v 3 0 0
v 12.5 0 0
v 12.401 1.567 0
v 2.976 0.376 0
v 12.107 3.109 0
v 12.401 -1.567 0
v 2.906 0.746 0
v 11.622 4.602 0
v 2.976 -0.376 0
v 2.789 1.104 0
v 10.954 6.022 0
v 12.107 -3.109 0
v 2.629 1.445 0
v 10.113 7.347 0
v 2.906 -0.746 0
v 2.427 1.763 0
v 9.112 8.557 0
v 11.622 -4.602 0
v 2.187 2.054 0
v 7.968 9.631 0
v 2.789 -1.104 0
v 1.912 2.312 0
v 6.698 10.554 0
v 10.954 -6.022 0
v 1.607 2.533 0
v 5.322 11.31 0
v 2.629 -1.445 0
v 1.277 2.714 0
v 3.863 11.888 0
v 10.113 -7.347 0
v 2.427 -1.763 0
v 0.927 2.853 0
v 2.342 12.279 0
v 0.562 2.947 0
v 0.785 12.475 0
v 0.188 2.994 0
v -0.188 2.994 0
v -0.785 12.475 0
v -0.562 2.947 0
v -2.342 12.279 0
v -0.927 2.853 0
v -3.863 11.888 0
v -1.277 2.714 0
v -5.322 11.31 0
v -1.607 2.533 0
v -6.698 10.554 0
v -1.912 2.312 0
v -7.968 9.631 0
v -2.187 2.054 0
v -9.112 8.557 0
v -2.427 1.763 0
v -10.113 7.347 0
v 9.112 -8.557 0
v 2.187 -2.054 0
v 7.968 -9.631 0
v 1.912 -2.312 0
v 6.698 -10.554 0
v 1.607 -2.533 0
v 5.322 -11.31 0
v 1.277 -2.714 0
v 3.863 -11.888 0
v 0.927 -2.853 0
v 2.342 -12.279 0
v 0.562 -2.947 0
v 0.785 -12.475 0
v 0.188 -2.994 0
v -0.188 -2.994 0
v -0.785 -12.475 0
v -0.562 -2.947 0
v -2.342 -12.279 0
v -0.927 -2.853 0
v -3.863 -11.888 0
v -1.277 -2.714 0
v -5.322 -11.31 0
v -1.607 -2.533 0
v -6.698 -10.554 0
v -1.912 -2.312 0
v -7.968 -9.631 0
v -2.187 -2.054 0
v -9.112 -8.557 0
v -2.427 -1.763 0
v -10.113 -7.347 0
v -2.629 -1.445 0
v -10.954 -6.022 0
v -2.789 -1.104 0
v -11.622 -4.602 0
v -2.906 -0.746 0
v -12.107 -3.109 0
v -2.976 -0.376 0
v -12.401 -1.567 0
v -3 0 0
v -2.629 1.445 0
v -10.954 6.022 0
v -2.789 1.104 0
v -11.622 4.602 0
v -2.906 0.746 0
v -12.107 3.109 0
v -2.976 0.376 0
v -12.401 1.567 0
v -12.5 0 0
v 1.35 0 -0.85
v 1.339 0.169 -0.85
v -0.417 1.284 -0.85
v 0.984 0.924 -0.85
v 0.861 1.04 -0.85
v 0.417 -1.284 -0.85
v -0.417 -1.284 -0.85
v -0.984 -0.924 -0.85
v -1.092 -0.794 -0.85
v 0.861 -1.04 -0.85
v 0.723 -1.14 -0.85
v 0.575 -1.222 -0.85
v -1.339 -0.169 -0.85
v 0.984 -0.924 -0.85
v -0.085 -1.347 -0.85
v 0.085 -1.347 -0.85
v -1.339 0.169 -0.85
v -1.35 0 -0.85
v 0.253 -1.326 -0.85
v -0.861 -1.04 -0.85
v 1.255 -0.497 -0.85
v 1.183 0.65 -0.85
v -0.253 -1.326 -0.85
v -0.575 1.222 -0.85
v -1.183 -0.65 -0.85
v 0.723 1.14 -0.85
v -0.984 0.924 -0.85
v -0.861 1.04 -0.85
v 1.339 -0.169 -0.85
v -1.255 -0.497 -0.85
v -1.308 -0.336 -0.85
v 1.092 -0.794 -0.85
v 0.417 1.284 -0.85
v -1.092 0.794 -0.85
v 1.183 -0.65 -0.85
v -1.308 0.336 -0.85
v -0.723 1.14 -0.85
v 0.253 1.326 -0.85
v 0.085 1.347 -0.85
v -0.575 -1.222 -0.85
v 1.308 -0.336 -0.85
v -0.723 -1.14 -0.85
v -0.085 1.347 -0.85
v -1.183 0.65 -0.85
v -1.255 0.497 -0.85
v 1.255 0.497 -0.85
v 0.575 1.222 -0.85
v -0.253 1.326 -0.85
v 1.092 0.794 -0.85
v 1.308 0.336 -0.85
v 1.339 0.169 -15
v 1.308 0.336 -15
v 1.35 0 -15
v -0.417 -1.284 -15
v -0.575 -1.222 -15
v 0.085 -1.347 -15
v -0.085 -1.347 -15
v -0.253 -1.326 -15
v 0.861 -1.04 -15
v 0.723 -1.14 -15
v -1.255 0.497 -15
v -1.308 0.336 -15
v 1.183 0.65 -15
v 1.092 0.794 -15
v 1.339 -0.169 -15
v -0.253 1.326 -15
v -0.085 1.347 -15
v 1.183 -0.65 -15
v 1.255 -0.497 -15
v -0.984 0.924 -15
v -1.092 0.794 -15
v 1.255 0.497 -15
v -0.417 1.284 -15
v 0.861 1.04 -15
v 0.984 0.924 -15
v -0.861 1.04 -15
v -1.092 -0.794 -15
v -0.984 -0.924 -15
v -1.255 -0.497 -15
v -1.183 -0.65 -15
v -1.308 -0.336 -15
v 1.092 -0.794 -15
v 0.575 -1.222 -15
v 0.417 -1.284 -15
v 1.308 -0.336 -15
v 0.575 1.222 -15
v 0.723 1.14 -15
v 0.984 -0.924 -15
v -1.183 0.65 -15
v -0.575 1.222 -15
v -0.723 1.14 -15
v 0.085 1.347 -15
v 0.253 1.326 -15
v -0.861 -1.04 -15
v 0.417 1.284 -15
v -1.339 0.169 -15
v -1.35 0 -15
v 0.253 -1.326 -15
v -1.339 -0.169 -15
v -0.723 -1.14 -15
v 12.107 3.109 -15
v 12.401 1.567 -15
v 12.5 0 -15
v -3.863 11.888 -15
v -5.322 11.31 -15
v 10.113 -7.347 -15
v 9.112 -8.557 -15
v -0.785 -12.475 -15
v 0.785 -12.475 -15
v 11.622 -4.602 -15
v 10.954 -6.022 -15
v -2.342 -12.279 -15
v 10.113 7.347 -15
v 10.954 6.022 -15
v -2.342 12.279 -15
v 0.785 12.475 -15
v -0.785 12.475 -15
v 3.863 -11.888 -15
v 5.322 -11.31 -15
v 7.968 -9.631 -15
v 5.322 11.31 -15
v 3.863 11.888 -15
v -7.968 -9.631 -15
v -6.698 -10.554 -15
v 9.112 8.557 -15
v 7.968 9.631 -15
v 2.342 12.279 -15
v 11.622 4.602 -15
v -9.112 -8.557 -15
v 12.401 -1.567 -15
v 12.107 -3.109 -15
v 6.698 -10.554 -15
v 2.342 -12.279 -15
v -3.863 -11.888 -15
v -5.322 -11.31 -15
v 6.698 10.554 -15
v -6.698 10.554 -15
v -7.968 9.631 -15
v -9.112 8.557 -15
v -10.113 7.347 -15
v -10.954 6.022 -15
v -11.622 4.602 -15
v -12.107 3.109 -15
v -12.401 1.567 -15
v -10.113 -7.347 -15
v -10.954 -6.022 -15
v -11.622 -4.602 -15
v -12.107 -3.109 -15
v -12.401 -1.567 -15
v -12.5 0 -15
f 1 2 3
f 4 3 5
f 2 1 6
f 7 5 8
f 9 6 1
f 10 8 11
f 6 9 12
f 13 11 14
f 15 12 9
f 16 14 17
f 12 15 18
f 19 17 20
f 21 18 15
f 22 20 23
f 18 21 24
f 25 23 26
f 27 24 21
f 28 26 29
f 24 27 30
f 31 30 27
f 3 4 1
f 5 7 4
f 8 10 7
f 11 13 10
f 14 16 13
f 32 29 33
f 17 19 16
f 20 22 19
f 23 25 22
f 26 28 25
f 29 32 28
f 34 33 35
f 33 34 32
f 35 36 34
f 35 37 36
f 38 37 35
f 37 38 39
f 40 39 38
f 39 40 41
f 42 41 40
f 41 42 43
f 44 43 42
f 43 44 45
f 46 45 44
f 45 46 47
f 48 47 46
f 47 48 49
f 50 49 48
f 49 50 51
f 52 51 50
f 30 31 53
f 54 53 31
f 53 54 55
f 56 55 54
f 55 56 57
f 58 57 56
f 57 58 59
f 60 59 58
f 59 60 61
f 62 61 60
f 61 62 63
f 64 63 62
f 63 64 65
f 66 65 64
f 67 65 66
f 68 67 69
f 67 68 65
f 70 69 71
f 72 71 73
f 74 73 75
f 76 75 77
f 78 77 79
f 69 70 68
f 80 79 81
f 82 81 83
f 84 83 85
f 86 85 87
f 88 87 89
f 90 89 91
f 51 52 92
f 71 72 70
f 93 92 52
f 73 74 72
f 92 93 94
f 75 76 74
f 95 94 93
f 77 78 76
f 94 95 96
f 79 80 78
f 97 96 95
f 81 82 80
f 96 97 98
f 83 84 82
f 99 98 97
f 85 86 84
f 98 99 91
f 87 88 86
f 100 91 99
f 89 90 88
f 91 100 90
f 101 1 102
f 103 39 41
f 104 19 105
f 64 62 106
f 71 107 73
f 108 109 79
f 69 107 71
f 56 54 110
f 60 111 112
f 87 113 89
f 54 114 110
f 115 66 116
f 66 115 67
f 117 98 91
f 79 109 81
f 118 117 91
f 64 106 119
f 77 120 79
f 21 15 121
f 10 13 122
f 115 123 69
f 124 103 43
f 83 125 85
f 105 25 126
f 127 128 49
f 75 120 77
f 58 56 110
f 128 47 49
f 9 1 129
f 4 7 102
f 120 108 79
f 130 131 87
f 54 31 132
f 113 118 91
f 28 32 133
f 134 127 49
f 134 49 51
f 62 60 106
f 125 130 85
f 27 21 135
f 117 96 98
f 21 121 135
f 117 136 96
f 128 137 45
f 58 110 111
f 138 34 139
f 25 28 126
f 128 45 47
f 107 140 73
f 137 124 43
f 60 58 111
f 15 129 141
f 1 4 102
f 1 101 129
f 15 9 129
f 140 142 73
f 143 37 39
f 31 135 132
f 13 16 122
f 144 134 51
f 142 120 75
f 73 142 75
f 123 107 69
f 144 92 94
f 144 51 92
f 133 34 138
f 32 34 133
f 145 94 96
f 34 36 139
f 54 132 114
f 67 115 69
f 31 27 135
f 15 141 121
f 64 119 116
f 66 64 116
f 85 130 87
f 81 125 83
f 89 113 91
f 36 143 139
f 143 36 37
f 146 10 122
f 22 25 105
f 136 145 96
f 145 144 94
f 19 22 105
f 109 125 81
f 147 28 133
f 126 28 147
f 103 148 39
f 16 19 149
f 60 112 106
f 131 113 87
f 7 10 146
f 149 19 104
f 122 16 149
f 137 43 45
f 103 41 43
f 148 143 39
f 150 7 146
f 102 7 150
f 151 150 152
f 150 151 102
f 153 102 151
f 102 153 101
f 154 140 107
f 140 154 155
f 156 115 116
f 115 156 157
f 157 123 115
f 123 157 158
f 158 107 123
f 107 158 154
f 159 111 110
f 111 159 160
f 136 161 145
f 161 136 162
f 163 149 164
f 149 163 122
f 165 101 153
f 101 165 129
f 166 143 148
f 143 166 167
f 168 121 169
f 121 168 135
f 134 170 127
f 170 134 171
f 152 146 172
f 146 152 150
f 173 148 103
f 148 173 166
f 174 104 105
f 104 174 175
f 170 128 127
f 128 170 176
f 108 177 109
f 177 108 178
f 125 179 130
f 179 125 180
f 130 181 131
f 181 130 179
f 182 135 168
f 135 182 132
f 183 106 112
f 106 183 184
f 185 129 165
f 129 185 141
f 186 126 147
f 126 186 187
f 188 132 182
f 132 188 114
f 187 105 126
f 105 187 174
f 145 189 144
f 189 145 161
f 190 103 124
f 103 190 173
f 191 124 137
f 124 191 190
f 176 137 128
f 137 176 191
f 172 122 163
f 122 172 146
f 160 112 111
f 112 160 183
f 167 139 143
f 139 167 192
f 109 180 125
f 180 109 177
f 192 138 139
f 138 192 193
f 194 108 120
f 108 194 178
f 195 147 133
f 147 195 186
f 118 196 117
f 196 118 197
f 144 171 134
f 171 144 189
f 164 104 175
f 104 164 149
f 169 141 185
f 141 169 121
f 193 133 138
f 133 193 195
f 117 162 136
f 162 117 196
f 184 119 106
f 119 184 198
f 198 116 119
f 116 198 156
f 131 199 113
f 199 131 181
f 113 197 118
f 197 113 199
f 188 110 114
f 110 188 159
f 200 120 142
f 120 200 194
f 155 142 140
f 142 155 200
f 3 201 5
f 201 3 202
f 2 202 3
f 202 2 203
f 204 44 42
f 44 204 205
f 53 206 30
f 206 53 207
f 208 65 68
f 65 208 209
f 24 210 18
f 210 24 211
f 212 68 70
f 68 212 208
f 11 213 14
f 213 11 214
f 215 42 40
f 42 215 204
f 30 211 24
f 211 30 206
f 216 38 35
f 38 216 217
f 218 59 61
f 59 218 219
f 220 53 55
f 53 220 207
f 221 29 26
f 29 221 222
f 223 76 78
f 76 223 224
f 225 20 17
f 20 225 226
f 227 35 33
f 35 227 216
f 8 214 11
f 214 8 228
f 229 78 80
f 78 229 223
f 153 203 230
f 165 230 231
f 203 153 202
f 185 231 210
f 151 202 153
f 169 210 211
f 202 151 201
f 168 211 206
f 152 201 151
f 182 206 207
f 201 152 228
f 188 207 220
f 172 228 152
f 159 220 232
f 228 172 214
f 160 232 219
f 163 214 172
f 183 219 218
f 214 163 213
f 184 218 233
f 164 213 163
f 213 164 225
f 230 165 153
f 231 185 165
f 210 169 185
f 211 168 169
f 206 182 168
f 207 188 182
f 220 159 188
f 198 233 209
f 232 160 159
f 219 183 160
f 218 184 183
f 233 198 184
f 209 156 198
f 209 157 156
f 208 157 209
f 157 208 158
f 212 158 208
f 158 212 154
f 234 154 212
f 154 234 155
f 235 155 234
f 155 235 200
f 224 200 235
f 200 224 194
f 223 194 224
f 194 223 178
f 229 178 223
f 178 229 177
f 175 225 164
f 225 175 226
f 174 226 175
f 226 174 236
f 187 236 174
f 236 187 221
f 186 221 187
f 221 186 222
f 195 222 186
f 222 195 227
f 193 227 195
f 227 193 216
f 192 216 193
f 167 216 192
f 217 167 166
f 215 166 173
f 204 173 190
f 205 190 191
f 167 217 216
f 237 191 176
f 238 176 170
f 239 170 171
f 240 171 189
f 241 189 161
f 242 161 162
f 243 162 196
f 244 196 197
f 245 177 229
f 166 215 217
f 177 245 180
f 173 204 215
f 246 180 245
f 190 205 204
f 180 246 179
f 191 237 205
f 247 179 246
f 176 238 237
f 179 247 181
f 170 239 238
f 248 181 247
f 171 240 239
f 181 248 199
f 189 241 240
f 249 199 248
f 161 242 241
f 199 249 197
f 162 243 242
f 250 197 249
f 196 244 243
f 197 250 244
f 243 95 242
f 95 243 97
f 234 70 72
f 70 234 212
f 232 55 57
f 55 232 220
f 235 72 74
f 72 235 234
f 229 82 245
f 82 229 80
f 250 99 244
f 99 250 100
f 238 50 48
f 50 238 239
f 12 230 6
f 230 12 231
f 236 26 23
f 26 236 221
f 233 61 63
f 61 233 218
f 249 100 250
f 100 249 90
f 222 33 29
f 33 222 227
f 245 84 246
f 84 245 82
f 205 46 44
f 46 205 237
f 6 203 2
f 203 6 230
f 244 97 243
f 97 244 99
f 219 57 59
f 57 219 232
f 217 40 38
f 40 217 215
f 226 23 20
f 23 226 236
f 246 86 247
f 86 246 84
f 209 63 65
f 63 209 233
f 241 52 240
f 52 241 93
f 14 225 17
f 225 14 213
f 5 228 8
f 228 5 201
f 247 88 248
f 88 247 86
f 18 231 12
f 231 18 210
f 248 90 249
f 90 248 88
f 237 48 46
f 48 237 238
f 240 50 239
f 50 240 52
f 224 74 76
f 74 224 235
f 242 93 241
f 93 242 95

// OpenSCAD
$fn = 50;

difference() {
	union() {
		translate(v = [0, 0, -15.0]) {
			cylinder(h = 15, r = 12.5);
		}
	}
	union() {
		translate(v = [0, 0, 0]) {
			rotate(a = [0, 0, 0]) {
				difference() {
					union() {
						translate(v = [0, 0, -18.0]) {
							cylinder(h = 18, r = 1.0);
						}
						translate(v = [0, 0, -0.85]) {
							cylinder(h = 0.85, r1 = 1.35, r2 = 3.0);
						}
						translate(v = [0, 0, -18.0]) {
							cylinder(h = 18, r = 1.35);
						}
						translate(v = [0, 0, -18.0]) {
							cylinder(h = 18, r = 1.0);
						}
					}
					union();
				}
			}
		}
	}
}
